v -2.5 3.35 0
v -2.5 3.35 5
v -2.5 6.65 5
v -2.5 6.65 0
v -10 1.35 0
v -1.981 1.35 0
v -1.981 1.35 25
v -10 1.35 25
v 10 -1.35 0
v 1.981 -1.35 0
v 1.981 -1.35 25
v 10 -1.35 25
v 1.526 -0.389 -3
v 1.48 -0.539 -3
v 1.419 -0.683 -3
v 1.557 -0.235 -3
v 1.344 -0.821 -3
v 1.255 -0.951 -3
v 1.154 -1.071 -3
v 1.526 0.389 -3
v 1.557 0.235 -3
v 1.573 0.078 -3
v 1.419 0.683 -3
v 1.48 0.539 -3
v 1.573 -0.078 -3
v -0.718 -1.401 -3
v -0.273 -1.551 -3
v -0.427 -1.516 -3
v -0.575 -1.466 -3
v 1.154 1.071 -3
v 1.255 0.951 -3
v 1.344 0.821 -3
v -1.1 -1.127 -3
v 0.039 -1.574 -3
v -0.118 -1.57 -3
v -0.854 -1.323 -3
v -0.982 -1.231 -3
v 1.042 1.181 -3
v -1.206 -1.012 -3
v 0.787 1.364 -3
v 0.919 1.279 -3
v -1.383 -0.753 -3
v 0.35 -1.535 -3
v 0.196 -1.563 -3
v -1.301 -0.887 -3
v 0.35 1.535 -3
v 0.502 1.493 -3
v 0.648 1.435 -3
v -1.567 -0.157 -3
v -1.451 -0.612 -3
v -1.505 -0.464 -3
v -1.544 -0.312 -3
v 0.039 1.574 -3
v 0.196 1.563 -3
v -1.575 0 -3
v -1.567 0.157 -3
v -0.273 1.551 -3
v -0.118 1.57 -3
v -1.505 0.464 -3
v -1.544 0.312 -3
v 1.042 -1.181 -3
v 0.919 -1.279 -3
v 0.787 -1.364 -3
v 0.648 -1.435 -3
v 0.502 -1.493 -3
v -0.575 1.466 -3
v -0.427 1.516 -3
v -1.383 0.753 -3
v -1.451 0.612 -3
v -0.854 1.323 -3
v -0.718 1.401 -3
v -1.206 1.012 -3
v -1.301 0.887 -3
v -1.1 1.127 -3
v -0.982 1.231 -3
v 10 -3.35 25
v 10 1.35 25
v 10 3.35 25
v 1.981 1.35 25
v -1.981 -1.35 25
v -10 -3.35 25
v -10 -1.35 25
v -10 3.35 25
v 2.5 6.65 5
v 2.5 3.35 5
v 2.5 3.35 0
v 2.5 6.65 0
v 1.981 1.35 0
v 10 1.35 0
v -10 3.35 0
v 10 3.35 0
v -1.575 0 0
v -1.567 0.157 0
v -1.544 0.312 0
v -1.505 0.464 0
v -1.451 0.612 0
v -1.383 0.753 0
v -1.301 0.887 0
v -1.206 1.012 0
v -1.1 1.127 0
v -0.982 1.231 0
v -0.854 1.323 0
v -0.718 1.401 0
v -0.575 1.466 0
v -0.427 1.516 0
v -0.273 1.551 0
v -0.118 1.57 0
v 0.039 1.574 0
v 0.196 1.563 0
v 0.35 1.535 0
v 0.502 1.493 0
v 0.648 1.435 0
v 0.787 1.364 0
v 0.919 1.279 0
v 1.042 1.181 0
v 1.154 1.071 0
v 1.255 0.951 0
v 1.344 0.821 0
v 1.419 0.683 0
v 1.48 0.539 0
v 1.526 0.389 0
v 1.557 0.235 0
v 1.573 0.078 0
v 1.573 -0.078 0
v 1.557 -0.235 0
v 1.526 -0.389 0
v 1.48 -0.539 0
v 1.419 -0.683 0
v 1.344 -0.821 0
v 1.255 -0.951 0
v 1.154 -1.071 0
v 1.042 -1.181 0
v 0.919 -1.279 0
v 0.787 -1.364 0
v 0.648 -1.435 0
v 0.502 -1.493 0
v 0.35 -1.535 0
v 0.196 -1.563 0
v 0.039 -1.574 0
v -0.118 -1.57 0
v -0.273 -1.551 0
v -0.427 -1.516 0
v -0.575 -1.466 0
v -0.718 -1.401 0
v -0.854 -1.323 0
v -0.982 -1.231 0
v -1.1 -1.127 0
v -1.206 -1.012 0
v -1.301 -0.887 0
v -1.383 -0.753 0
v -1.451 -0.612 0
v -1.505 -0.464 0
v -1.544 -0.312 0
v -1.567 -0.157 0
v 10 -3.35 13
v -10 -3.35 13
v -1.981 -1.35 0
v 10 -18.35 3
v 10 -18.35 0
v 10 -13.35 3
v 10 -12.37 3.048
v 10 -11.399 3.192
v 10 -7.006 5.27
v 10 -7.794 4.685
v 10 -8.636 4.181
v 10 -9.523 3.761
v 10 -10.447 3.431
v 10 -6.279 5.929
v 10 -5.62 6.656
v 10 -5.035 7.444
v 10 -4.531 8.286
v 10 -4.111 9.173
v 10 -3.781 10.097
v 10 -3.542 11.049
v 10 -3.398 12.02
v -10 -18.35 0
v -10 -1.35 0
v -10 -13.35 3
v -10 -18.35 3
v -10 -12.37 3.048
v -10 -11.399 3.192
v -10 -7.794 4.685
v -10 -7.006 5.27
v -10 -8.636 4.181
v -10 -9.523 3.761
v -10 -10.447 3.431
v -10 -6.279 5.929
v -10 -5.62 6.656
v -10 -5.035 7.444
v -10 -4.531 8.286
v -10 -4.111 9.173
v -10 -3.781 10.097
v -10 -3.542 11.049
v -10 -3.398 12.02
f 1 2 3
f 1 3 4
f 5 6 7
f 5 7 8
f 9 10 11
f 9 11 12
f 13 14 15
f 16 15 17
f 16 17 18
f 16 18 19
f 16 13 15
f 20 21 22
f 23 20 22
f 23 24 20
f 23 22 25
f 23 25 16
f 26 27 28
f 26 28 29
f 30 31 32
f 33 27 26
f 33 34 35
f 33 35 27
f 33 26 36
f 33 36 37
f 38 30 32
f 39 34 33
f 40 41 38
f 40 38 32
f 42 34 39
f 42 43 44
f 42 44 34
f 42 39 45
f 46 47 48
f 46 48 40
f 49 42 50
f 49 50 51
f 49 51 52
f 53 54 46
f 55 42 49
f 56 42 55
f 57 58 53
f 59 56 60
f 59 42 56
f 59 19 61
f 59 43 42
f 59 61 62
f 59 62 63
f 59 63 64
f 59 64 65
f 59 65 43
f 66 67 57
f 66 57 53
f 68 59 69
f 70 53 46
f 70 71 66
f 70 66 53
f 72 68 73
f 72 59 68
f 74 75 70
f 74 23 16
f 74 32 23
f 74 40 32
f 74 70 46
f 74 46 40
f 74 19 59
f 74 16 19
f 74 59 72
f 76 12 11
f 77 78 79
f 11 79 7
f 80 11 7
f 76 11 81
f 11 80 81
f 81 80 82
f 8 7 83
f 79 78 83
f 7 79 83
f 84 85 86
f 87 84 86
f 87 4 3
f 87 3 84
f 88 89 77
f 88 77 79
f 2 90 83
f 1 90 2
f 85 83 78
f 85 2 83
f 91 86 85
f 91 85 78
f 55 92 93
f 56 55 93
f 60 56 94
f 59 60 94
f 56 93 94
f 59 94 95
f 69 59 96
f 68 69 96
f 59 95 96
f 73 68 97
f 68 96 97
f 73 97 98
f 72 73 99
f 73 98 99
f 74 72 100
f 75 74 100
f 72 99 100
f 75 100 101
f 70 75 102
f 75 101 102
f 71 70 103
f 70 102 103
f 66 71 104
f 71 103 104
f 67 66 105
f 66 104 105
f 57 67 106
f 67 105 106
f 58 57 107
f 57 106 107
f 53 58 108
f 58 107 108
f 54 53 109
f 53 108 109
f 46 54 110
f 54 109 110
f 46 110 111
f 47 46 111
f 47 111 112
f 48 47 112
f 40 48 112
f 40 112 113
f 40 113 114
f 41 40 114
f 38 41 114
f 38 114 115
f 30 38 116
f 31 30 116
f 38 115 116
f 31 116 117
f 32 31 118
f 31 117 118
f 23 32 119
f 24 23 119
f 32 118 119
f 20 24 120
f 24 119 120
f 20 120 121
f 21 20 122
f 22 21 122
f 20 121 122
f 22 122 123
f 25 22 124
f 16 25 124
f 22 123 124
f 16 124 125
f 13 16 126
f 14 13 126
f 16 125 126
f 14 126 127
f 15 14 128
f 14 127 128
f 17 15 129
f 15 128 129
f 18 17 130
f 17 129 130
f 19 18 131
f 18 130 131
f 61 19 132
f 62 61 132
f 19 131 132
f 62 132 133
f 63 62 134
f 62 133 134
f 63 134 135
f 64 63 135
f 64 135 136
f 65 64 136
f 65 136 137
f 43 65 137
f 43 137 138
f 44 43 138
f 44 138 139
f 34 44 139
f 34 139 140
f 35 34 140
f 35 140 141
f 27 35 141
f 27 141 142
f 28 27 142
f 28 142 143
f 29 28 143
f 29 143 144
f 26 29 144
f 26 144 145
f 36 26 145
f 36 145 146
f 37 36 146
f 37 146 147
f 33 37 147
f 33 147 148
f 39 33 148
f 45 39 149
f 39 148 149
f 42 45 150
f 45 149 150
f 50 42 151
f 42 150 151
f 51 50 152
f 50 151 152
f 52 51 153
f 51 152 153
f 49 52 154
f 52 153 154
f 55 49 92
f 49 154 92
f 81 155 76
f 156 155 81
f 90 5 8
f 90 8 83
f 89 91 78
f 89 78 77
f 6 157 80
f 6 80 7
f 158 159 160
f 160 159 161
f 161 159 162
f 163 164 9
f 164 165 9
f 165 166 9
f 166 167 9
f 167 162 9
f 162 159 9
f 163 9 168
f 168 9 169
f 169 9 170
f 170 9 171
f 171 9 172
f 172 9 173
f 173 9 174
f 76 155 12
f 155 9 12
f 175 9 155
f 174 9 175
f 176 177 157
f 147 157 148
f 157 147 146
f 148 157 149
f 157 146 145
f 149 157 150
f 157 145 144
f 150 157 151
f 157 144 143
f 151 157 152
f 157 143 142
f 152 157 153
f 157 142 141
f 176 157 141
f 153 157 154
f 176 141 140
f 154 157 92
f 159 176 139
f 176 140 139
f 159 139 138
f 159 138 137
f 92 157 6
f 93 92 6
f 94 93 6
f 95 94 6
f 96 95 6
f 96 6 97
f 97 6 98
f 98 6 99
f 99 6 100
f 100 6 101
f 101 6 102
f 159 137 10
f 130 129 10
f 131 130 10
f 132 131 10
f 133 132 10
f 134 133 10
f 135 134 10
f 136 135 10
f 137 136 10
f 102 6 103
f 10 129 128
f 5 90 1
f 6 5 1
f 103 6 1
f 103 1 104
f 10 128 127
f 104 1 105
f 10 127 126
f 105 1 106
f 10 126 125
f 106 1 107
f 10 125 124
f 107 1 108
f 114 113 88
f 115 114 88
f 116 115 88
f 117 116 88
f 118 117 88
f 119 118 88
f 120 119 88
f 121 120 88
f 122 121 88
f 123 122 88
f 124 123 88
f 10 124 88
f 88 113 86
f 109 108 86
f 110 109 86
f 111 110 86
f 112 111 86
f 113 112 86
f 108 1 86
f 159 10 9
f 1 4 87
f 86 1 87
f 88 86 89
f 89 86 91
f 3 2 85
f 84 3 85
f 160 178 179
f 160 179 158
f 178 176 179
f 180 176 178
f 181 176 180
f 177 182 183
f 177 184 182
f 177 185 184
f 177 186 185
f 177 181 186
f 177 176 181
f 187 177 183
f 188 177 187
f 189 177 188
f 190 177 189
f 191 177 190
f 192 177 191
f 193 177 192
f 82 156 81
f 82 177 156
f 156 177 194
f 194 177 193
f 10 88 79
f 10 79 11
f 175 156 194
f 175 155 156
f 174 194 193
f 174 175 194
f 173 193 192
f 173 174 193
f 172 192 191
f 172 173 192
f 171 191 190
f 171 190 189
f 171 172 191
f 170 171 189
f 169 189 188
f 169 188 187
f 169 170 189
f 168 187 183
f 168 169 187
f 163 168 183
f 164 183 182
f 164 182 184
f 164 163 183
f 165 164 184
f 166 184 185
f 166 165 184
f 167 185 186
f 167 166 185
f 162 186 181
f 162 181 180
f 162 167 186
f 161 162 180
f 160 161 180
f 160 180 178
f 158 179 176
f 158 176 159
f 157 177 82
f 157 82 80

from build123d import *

# Parameters (mm, degrees)
BOSS_EXTRUDE1_DEPTH = 25
SKETCH2_W           = 20
SKETCH2_H           = 3
BOSS_EXTRUDE2_DEPTH = 15
FILLET1_R           = 10
SKETCH3_R           = 1.5748
BOSS_EXTRUDE3_DEPTH = 3
SKETCH4_W           = 5
SKETCH4_H           = 5
BOSS_EXTRUDE4_DEPTH = 3.3


with BuildPart() as part:
    # Sketch1 → Boss-Extrude1 (new body)
    with BuildSketch(Plane.XY):
        Polygon((10, -3.35), (-10, -3.35), (-10, -1.35), (-1.9812, -1.35), (-1.9812, 1.35), (-10, 1.35), (-10, 3.35), (10, 3.35), (10, 1.35), (1.9812, 1.35), (1.9812, -1.35), (10, -1.35), align=None)
    extrude(amount=BOSS_EXTRUDE1_DEPTH)

    # Sketch2 → Boss-Extrude2 (add)
    with BuildSketch(Plane.XZ.offset(3.35)):
        with Locations((0, 1.5)):
            Rectangle(SKETCH2_W, SKETCH2_H)
    extrude(amount=BOSS_EXTRUDE2_DEPTH)

    # Fillet1
    fillet1_edges = [part.edges().sort_by_distance(p)[0] for p in [
        (0, -3.35, 3),
    ]]
    fillet(fillet1_edges, radius=FILLET1_R)

    # Sketch3 → Boss-Extrude3 (add)
    with BuildSketch(Plane(origin=(0, 0, 0), x_dir=(-1, 0, 0), z_dir=(0, 0, -1))):
        Circle(SKETCH3_R)
    extrude(amount=BOSS_EXTRUDE3_DEPTH)

    # Sketch4 → Boss-Extrude4 (add)
    with BuildSketch(Plane(origin=(0, 3.35, 0), x_dir=(1, 0, 0), z_dir=(0, 1, 0))):
        with Locations((0, -2.5)):
            Rectangle(SKETCH4_W, SKETCH4_H)
    extrude(amount=BOSS_EXTRUDE4_DEPTH)


solid = part.part
